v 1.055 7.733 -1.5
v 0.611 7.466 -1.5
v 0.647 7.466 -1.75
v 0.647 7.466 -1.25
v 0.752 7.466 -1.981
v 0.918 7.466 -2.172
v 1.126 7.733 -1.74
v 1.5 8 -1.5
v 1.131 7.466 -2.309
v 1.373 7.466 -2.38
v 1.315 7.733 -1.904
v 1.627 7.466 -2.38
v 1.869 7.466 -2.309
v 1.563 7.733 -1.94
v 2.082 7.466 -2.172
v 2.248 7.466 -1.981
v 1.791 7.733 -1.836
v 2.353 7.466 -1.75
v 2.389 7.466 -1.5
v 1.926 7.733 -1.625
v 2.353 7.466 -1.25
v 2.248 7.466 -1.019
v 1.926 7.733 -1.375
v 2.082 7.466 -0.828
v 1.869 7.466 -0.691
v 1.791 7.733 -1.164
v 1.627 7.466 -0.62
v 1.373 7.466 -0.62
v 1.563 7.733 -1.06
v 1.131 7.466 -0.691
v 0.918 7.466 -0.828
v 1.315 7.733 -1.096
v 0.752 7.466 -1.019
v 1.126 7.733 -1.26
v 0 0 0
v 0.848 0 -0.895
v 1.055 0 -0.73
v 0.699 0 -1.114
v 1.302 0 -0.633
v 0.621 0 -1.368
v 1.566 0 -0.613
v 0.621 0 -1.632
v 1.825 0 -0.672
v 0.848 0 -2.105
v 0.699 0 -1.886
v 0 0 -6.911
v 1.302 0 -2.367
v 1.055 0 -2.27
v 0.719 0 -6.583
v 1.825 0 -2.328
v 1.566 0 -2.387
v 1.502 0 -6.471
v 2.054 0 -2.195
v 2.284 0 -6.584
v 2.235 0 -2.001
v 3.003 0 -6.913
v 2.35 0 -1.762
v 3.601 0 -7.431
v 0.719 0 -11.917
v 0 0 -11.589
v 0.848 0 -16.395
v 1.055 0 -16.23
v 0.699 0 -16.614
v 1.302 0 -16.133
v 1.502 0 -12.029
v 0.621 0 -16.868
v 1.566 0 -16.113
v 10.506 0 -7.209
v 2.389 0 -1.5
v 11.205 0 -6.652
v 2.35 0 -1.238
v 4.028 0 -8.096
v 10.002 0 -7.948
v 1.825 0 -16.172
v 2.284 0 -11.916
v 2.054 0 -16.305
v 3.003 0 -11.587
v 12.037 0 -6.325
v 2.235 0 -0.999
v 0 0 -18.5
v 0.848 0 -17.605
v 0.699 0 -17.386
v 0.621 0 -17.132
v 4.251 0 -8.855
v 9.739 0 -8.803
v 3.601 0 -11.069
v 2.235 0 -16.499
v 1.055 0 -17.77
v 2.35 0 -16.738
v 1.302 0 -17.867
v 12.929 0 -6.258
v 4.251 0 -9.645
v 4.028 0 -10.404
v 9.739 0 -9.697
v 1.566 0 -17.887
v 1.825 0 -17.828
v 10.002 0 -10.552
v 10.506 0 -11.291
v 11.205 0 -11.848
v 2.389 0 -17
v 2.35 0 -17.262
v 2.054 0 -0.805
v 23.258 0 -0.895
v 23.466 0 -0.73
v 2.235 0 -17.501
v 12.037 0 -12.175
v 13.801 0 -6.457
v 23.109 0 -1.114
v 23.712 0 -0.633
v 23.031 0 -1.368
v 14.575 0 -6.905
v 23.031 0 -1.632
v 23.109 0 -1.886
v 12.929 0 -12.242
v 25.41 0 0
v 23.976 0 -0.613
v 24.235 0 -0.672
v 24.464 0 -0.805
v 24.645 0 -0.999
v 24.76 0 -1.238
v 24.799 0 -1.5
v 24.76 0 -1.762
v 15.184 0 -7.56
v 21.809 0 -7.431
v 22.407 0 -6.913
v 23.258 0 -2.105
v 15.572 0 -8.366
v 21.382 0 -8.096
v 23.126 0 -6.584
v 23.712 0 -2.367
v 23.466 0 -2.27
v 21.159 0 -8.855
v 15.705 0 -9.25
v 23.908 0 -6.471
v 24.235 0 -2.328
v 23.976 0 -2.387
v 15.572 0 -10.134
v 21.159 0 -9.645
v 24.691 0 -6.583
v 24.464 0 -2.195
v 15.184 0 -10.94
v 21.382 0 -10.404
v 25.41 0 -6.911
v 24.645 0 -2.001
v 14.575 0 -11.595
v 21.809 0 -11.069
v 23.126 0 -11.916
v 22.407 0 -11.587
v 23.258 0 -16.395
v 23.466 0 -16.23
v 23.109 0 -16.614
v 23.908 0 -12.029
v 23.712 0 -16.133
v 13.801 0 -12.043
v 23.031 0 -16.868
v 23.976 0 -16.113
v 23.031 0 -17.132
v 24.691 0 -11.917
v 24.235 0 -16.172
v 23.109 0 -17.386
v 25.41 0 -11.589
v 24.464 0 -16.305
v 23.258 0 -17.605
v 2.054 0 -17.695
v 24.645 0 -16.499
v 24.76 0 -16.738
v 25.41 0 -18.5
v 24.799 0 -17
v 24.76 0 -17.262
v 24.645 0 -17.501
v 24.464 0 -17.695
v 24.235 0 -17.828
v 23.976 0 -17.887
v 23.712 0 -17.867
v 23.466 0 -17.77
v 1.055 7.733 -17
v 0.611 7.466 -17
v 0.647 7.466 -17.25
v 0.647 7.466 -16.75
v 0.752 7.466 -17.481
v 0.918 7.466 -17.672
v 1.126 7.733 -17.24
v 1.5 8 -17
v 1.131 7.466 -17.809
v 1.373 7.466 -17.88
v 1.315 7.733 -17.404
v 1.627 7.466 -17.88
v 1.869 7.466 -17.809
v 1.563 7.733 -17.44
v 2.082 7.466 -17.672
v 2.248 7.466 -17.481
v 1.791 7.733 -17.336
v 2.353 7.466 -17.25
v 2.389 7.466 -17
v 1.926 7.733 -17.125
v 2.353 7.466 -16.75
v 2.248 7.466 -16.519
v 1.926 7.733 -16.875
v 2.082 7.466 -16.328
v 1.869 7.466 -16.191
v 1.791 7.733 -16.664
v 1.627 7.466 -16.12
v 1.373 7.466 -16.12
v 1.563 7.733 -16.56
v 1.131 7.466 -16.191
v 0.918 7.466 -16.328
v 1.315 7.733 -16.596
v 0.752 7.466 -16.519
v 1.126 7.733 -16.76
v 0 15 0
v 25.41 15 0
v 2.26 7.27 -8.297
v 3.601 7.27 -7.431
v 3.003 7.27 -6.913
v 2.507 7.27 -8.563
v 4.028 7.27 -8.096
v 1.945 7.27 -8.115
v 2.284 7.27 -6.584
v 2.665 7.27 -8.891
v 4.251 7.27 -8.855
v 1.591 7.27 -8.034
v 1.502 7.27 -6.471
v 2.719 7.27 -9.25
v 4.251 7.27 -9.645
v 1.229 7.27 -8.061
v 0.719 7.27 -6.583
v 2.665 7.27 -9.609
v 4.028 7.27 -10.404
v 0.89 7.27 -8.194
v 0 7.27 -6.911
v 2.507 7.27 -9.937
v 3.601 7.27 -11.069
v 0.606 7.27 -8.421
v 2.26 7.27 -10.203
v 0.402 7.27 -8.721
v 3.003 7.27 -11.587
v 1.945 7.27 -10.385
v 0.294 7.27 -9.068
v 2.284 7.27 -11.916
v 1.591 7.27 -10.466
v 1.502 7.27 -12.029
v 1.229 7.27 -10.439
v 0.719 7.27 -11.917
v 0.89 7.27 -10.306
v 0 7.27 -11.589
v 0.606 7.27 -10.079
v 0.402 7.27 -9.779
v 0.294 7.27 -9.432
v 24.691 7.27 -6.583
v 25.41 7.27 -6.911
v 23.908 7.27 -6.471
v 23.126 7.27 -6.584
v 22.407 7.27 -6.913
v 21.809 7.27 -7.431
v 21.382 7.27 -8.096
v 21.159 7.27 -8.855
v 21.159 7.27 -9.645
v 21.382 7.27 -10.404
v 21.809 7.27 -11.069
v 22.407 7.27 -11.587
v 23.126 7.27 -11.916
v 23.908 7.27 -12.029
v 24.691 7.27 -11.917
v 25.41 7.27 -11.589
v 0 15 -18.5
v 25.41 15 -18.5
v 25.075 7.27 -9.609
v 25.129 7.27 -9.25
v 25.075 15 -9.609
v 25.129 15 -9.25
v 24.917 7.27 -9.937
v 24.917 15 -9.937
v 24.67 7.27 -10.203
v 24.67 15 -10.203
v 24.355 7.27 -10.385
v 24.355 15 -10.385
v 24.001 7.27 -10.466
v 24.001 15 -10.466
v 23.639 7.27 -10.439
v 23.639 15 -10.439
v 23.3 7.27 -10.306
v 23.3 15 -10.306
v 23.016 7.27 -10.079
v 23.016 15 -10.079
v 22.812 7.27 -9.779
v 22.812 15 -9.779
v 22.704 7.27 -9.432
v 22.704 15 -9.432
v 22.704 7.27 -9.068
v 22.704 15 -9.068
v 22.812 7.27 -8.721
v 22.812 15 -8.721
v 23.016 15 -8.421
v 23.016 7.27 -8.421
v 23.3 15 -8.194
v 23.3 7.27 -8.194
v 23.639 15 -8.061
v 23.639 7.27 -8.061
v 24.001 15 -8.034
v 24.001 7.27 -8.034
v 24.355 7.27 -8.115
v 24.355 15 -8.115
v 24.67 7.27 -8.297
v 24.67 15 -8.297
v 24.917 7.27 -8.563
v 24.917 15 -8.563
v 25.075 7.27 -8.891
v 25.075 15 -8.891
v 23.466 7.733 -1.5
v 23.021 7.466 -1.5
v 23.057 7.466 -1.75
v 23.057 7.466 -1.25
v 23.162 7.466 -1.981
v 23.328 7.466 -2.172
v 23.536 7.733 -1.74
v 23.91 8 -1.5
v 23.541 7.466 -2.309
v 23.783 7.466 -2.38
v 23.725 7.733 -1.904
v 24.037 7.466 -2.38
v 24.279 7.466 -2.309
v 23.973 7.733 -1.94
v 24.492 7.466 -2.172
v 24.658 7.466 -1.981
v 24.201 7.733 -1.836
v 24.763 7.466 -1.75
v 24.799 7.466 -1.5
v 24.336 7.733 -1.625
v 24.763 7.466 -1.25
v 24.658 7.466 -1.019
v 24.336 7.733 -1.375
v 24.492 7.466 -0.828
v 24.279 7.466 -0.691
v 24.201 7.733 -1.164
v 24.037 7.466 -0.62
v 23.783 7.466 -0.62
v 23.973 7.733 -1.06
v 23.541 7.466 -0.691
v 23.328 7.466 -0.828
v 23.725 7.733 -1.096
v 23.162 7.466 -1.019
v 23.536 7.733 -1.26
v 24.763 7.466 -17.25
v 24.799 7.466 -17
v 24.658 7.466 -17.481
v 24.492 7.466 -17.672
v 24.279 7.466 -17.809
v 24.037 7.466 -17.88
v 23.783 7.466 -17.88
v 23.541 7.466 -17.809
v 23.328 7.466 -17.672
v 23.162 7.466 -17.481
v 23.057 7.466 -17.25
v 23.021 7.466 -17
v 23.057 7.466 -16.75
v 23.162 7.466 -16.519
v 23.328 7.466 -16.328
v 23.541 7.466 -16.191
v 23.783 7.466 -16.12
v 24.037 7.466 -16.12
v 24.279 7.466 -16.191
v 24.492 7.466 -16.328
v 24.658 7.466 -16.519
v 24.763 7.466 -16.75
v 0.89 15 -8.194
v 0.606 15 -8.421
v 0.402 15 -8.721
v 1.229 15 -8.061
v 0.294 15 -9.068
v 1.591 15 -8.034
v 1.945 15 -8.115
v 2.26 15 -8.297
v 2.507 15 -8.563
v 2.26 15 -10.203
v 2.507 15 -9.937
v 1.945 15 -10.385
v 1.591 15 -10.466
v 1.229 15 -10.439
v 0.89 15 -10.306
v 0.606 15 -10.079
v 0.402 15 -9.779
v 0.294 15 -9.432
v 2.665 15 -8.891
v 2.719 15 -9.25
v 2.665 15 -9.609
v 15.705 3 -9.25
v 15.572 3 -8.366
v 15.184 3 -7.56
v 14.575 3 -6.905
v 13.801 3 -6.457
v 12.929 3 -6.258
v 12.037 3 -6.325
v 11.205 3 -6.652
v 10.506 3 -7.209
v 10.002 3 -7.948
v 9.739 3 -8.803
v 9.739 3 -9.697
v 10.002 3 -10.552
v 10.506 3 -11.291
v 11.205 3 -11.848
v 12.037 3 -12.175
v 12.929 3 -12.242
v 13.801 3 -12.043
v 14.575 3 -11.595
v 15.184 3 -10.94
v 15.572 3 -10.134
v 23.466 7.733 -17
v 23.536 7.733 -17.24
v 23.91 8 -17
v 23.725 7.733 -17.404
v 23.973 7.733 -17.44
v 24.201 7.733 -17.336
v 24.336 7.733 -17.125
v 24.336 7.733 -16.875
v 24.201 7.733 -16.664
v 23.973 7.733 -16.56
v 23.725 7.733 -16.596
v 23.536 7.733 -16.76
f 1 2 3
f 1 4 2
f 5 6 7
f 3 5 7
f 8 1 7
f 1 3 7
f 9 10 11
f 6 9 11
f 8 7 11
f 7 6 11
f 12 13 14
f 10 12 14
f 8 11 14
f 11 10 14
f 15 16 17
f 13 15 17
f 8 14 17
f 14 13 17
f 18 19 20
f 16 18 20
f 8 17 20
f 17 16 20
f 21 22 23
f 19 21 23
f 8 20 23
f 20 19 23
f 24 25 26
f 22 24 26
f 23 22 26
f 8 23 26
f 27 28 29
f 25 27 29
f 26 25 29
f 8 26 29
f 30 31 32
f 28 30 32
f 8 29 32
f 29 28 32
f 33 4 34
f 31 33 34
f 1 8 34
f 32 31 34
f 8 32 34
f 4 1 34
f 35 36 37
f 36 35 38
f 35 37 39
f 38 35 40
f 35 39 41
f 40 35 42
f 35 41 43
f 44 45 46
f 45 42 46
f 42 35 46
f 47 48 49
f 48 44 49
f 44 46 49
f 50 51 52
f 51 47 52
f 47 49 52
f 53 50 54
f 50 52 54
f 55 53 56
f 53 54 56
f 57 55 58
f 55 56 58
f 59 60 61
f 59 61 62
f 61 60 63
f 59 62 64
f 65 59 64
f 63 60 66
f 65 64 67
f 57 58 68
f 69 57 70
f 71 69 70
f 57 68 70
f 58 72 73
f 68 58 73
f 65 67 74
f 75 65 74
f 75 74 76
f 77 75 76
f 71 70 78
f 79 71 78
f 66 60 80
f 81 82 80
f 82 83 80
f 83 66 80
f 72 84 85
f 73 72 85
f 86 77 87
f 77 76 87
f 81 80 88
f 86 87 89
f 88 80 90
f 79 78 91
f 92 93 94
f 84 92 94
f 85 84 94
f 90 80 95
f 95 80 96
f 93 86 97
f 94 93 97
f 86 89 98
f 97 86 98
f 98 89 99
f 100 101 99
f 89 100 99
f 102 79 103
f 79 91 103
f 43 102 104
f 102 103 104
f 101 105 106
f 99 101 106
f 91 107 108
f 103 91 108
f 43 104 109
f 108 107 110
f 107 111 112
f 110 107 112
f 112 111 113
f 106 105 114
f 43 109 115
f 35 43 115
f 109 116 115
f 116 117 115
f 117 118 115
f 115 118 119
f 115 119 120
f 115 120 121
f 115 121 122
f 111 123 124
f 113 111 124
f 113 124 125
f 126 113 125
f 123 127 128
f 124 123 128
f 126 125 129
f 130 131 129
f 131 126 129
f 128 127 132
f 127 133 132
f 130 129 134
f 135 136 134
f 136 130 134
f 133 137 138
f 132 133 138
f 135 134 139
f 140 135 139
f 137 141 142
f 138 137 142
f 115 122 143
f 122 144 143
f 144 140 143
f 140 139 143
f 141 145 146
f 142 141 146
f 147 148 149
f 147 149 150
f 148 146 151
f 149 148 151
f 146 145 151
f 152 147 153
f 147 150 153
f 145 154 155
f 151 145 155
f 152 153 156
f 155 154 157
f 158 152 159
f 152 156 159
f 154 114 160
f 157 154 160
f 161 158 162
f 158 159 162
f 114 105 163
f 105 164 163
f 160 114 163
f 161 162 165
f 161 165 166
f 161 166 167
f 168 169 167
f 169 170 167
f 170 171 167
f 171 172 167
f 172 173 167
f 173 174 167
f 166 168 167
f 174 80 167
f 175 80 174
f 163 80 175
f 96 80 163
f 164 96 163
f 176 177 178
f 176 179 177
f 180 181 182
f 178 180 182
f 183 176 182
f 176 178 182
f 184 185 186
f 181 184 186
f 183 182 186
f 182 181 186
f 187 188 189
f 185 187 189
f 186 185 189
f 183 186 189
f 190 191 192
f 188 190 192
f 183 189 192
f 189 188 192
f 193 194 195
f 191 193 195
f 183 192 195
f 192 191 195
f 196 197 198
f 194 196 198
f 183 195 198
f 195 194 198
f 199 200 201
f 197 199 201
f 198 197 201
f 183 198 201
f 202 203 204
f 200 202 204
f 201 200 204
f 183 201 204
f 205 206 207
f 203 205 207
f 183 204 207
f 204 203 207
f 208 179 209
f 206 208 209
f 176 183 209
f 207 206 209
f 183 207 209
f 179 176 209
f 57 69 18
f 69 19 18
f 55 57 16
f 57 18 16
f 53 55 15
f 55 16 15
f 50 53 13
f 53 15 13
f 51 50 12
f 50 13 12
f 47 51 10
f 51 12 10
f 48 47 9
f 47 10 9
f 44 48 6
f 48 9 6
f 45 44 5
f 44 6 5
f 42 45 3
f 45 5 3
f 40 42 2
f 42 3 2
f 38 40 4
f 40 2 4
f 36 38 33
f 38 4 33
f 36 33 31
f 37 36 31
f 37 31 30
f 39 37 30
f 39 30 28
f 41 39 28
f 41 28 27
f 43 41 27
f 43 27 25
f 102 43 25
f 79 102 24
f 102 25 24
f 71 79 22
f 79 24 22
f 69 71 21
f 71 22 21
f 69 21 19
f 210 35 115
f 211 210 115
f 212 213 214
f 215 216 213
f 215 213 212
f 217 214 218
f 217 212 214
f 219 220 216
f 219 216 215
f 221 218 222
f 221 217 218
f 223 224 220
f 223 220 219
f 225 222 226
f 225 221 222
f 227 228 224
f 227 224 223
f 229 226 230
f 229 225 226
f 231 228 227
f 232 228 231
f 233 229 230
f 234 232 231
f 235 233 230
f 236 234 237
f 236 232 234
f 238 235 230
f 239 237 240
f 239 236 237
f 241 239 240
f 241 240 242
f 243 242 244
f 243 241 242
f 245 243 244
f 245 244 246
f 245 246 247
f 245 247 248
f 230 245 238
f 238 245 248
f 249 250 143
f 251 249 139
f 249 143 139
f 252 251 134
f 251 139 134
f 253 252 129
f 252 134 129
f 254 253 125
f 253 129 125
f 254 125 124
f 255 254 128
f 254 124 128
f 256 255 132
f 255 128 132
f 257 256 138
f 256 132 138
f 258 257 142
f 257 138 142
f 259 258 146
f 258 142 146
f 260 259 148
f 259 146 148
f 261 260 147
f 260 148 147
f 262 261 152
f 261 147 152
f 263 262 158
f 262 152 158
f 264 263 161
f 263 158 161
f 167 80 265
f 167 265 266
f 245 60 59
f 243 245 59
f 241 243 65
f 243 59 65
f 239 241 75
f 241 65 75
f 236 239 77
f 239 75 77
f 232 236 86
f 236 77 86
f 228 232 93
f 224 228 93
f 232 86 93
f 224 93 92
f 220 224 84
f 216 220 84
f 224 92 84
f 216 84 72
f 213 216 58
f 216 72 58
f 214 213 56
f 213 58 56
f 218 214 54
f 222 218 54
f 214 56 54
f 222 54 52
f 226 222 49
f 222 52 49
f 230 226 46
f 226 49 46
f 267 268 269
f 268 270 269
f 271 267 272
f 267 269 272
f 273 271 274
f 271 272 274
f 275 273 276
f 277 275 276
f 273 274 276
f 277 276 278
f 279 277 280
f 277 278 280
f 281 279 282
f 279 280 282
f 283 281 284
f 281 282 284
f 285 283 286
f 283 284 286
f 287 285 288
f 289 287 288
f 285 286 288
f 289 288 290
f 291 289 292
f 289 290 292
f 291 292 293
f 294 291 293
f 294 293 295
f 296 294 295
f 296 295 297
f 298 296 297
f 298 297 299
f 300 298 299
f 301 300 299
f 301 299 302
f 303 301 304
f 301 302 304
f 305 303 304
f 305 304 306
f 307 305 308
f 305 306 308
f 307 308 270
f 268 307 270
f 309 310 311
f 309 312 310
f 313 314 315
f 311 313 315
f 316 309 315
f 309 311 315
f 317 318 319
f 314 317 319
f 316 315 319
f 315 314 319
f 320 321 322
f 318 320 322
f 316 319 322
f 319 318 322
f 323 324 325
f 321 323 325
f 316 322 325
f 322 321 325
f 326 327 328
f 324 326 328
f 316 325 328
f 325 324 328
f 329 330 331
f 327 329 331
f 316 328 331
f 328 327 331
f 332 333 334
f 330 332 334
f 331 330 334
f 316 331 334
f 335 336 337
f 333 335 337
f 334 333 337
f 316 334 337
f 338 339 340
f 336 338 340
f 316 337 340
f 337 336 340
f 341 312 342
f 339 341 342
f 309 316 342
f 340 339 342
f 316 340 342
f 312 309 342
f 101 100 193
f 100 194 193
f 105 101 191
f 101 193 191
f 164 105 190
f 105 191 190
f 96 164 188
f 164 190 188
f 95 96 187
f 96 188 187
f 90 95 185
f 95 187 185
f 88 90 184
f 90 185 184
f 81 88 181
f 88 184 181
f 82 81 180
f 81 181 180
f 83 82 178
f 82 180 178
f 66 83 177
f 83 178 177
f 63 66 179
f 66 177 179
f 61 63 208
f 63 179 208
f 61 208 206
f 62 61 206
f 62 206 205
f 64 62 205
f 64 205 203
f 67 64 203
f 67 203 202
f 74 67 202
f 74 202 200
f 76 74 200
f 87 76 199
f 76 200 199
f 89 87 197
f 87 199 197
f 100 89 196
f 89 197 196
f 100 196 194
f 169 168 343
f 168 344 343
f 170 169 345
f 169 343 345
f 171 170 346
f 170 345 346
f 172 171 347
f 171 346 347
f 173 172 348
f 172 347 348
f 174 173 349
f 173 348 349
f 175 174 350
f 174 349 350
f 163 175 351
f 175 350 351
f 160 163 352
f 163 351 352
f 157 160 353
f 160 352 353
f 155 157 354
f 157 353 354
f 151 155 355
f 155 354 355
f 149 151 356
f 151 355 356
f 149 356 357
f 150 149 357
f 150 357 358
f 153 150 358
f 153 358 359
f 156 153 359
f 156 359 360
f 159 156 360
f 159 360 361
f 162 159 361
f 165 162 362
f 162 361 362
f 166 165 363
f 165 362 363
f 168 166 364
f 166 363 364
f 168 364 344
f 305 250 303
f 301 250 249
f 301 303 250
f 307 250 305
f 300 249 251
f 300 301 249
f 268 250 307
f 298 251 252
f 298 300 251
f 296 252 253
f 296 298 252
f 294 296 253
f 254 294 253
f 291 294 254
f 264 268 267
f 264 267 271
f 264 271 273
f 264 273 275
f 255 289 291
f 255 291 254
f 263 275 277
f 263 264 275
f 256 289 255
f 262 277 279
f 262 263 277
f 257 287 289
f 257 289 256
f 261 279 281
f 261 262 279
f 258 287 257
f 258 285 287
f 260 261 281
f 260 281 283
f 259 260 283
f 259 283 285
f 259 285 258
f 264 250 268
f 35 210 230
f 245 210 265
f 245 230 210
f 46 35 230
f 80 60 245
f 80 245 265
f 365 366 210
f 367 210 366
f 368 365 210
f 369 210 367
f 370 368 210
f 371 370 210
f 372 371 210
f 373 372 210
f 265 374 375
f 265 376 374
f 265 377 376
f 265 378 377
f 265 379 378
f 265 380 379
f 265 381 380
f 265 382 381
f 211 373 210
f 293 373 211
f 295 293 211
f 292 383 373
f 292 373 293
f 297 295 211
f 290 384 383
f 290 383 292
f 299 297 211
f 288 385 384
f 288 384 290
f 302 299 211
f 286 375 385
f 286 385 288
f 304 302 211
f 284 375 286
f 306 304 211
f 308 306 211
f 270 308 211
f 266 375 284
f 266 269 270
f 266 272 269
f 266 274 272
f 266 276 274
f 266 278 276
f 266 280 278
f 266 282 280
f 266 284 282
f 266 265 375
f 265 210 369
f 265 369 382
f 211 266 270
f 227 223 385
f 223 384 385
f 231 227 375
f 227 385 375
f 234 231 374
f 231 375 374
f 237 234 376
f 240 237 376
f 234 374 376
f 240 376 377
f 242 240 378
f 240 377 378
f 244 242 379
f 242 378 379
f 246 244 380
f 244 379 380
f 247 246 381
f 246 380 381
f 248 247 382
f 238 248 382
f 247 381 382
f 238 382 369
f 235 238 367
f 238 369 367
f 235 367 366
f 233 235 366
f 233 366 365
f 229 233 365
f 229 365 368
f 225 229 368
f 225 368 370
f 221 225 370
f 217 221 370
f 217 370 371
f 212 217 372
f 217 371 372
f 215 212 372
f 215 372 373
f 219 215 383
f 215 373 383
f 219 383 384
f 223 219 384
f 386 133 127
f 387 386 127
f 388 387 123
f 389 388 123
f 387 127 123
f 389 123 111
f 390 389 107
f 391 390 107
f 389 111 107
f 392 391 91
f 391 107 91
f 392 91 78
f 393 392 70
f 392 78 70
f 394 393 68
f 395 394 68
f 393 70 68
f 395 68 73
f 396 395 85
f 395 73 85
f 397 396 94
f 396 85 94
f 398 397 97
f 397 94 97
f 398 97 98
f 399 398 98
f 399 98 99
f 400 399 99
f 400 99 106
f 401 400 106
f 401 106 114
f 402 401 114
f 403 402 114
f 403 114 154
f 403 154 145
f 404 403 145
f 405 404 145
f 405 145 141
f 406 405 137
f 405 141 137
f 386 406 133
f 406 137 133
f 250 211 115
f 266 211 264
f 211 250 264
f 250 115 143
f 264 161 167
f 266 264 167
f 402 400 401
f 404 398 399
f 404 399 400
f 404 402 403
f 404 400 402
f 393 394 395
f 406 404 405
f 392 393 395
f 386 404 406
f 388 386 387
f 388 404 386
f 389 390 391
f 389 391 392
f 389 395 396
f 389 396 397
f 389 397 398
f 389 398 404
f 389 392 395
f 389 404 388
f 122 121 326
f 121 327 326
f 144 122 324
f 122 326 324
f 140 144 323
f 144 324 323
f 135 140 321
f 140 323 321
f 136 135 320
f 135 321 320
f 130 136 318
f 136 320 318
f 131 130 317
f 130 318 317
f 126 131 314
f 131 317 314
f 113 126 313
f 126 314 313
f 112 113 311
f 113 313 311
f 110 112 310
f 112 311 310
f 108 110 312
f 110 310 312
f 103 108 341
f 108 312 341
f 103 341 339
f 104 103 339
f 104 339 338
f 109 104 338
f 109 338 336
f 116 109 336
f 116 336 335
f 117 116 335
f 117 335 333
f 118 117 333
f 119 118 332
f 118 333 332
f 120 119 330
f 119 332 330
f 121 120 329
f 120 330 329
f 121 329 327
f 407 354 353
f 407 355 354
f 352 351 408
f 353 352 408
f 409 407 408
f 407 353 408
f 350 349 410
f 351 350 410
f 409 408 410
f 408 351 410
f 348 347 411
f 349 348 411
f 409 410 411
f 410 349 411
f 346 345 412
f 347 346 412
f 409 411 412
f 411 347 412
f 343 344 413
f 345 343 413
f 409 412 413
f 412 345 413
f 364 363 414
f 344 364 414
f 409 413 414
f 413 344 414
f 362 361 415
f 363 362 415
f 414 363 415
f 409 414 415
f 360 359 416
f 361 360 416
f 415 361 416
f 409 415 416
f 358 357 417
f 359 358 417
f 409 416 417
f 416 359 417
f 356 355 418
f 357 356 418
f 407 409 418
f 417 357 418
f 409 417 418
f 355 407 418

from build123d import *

# Parameters (mm, degrees)
SKETCH1_W                                           = 25.41
SKETCH1_H                                           = 18.5
BOSS_EXTRUDE1_DEPTH                                 = 15
F_2_56_TAPPED_HOLE1_D                               = 1.778
F_2_56_TAPPED_HOLE1_DEPTH                           = 7.46583491
F_2_56_TAPPED_HOLE1_TIP                             = 0.53416509
SKETCH5_R                                           = 3
CUT_EXTRUDE1_DEPTH                                  = 3
CBORE_FOR_2_BINDING_HEAD_MACHINE_SCREW1_D           = 2.4384
CBORE_FOR_2_BINDING_HEAD_MACHINE_SCREW1_CBORE_D     = 5.55752
CBORE_FOR_2_BINDING_HEAD_MACHINE_SCREW1_CBORE_DEPTH = 7.269988


with BuildPart() as part:
    # Sketch1 → Boss-Extrude1 (new body)
    with BuildSketch(Plane(origin=(0, 0, 0), x_dir=(1, 0, 0), z_dir=(0, 1, 0))):
        with Locations((12.705, 9.25)):
            Rectangle(SKETCH1_W, SKETCH1_H)
    extrude(amount=BOSS_EXTRUDE1_DEPTH)

    # #2-56 Tapped Hole1
    with Locations(Plane(origin=(0, 0, 0), x_dir=(-1, 0, 0), z_dir=(0, -1, 0))):
        with Locations((-23.91, 17), (-23.91, 1.5), (-1.5, 1.5), (-1.5, 17)):
            Hole(F_2_56_TAPPED_HOLE1_D / 2, depth=F_2_56_TAPPED_HOLE1_DEPTH)
            with Locations((0, 0, -(F_2_56_TAPPED_HOLE1_DEPTH + F_2_56_TAPPED_HOLE1_TIP / 2))):  # 118° drill point
                Cone(0, F_2_56_TAPPED_HOLE1_D / 2, F_2_56_TAPPED_HOLE1_TIP, mode=Mode.SUBTRACT)

    # Sketch5 → Cut-Extrude1 (cut)
    with BuildSketch(Plane.XZ):
        with Locations((12.705, -9.25)):
            Circle(SKETCH5_R)
    extrude(amount=-CUT_EXTRUDE1_DEPTH, mode=Mode.SUBTRACT)

    # CBORE for #2 Binding Head Machine Screw1 (through all)
    with Locations(Plane(origin=(0, 0, 0), x_dir=(-1, 0, 0), z_dir=(0, -1, 0))):
        with Locations((-23.91, 9.25), (-1.5, 9.25)):
            CounterBoreHole(CBORE_FOR_2_BINDING_HEAD_MACHINE_SCREW1_D / 2, CBORE_FOR_2_BINDING_HEAD_MACHINE_SCREW1_CBORE_D / 2, CBORE_FOR_2_BINDING_HEAD_MACHINE_SCREW1_CBORE_DEPTH)


solid = part.part
